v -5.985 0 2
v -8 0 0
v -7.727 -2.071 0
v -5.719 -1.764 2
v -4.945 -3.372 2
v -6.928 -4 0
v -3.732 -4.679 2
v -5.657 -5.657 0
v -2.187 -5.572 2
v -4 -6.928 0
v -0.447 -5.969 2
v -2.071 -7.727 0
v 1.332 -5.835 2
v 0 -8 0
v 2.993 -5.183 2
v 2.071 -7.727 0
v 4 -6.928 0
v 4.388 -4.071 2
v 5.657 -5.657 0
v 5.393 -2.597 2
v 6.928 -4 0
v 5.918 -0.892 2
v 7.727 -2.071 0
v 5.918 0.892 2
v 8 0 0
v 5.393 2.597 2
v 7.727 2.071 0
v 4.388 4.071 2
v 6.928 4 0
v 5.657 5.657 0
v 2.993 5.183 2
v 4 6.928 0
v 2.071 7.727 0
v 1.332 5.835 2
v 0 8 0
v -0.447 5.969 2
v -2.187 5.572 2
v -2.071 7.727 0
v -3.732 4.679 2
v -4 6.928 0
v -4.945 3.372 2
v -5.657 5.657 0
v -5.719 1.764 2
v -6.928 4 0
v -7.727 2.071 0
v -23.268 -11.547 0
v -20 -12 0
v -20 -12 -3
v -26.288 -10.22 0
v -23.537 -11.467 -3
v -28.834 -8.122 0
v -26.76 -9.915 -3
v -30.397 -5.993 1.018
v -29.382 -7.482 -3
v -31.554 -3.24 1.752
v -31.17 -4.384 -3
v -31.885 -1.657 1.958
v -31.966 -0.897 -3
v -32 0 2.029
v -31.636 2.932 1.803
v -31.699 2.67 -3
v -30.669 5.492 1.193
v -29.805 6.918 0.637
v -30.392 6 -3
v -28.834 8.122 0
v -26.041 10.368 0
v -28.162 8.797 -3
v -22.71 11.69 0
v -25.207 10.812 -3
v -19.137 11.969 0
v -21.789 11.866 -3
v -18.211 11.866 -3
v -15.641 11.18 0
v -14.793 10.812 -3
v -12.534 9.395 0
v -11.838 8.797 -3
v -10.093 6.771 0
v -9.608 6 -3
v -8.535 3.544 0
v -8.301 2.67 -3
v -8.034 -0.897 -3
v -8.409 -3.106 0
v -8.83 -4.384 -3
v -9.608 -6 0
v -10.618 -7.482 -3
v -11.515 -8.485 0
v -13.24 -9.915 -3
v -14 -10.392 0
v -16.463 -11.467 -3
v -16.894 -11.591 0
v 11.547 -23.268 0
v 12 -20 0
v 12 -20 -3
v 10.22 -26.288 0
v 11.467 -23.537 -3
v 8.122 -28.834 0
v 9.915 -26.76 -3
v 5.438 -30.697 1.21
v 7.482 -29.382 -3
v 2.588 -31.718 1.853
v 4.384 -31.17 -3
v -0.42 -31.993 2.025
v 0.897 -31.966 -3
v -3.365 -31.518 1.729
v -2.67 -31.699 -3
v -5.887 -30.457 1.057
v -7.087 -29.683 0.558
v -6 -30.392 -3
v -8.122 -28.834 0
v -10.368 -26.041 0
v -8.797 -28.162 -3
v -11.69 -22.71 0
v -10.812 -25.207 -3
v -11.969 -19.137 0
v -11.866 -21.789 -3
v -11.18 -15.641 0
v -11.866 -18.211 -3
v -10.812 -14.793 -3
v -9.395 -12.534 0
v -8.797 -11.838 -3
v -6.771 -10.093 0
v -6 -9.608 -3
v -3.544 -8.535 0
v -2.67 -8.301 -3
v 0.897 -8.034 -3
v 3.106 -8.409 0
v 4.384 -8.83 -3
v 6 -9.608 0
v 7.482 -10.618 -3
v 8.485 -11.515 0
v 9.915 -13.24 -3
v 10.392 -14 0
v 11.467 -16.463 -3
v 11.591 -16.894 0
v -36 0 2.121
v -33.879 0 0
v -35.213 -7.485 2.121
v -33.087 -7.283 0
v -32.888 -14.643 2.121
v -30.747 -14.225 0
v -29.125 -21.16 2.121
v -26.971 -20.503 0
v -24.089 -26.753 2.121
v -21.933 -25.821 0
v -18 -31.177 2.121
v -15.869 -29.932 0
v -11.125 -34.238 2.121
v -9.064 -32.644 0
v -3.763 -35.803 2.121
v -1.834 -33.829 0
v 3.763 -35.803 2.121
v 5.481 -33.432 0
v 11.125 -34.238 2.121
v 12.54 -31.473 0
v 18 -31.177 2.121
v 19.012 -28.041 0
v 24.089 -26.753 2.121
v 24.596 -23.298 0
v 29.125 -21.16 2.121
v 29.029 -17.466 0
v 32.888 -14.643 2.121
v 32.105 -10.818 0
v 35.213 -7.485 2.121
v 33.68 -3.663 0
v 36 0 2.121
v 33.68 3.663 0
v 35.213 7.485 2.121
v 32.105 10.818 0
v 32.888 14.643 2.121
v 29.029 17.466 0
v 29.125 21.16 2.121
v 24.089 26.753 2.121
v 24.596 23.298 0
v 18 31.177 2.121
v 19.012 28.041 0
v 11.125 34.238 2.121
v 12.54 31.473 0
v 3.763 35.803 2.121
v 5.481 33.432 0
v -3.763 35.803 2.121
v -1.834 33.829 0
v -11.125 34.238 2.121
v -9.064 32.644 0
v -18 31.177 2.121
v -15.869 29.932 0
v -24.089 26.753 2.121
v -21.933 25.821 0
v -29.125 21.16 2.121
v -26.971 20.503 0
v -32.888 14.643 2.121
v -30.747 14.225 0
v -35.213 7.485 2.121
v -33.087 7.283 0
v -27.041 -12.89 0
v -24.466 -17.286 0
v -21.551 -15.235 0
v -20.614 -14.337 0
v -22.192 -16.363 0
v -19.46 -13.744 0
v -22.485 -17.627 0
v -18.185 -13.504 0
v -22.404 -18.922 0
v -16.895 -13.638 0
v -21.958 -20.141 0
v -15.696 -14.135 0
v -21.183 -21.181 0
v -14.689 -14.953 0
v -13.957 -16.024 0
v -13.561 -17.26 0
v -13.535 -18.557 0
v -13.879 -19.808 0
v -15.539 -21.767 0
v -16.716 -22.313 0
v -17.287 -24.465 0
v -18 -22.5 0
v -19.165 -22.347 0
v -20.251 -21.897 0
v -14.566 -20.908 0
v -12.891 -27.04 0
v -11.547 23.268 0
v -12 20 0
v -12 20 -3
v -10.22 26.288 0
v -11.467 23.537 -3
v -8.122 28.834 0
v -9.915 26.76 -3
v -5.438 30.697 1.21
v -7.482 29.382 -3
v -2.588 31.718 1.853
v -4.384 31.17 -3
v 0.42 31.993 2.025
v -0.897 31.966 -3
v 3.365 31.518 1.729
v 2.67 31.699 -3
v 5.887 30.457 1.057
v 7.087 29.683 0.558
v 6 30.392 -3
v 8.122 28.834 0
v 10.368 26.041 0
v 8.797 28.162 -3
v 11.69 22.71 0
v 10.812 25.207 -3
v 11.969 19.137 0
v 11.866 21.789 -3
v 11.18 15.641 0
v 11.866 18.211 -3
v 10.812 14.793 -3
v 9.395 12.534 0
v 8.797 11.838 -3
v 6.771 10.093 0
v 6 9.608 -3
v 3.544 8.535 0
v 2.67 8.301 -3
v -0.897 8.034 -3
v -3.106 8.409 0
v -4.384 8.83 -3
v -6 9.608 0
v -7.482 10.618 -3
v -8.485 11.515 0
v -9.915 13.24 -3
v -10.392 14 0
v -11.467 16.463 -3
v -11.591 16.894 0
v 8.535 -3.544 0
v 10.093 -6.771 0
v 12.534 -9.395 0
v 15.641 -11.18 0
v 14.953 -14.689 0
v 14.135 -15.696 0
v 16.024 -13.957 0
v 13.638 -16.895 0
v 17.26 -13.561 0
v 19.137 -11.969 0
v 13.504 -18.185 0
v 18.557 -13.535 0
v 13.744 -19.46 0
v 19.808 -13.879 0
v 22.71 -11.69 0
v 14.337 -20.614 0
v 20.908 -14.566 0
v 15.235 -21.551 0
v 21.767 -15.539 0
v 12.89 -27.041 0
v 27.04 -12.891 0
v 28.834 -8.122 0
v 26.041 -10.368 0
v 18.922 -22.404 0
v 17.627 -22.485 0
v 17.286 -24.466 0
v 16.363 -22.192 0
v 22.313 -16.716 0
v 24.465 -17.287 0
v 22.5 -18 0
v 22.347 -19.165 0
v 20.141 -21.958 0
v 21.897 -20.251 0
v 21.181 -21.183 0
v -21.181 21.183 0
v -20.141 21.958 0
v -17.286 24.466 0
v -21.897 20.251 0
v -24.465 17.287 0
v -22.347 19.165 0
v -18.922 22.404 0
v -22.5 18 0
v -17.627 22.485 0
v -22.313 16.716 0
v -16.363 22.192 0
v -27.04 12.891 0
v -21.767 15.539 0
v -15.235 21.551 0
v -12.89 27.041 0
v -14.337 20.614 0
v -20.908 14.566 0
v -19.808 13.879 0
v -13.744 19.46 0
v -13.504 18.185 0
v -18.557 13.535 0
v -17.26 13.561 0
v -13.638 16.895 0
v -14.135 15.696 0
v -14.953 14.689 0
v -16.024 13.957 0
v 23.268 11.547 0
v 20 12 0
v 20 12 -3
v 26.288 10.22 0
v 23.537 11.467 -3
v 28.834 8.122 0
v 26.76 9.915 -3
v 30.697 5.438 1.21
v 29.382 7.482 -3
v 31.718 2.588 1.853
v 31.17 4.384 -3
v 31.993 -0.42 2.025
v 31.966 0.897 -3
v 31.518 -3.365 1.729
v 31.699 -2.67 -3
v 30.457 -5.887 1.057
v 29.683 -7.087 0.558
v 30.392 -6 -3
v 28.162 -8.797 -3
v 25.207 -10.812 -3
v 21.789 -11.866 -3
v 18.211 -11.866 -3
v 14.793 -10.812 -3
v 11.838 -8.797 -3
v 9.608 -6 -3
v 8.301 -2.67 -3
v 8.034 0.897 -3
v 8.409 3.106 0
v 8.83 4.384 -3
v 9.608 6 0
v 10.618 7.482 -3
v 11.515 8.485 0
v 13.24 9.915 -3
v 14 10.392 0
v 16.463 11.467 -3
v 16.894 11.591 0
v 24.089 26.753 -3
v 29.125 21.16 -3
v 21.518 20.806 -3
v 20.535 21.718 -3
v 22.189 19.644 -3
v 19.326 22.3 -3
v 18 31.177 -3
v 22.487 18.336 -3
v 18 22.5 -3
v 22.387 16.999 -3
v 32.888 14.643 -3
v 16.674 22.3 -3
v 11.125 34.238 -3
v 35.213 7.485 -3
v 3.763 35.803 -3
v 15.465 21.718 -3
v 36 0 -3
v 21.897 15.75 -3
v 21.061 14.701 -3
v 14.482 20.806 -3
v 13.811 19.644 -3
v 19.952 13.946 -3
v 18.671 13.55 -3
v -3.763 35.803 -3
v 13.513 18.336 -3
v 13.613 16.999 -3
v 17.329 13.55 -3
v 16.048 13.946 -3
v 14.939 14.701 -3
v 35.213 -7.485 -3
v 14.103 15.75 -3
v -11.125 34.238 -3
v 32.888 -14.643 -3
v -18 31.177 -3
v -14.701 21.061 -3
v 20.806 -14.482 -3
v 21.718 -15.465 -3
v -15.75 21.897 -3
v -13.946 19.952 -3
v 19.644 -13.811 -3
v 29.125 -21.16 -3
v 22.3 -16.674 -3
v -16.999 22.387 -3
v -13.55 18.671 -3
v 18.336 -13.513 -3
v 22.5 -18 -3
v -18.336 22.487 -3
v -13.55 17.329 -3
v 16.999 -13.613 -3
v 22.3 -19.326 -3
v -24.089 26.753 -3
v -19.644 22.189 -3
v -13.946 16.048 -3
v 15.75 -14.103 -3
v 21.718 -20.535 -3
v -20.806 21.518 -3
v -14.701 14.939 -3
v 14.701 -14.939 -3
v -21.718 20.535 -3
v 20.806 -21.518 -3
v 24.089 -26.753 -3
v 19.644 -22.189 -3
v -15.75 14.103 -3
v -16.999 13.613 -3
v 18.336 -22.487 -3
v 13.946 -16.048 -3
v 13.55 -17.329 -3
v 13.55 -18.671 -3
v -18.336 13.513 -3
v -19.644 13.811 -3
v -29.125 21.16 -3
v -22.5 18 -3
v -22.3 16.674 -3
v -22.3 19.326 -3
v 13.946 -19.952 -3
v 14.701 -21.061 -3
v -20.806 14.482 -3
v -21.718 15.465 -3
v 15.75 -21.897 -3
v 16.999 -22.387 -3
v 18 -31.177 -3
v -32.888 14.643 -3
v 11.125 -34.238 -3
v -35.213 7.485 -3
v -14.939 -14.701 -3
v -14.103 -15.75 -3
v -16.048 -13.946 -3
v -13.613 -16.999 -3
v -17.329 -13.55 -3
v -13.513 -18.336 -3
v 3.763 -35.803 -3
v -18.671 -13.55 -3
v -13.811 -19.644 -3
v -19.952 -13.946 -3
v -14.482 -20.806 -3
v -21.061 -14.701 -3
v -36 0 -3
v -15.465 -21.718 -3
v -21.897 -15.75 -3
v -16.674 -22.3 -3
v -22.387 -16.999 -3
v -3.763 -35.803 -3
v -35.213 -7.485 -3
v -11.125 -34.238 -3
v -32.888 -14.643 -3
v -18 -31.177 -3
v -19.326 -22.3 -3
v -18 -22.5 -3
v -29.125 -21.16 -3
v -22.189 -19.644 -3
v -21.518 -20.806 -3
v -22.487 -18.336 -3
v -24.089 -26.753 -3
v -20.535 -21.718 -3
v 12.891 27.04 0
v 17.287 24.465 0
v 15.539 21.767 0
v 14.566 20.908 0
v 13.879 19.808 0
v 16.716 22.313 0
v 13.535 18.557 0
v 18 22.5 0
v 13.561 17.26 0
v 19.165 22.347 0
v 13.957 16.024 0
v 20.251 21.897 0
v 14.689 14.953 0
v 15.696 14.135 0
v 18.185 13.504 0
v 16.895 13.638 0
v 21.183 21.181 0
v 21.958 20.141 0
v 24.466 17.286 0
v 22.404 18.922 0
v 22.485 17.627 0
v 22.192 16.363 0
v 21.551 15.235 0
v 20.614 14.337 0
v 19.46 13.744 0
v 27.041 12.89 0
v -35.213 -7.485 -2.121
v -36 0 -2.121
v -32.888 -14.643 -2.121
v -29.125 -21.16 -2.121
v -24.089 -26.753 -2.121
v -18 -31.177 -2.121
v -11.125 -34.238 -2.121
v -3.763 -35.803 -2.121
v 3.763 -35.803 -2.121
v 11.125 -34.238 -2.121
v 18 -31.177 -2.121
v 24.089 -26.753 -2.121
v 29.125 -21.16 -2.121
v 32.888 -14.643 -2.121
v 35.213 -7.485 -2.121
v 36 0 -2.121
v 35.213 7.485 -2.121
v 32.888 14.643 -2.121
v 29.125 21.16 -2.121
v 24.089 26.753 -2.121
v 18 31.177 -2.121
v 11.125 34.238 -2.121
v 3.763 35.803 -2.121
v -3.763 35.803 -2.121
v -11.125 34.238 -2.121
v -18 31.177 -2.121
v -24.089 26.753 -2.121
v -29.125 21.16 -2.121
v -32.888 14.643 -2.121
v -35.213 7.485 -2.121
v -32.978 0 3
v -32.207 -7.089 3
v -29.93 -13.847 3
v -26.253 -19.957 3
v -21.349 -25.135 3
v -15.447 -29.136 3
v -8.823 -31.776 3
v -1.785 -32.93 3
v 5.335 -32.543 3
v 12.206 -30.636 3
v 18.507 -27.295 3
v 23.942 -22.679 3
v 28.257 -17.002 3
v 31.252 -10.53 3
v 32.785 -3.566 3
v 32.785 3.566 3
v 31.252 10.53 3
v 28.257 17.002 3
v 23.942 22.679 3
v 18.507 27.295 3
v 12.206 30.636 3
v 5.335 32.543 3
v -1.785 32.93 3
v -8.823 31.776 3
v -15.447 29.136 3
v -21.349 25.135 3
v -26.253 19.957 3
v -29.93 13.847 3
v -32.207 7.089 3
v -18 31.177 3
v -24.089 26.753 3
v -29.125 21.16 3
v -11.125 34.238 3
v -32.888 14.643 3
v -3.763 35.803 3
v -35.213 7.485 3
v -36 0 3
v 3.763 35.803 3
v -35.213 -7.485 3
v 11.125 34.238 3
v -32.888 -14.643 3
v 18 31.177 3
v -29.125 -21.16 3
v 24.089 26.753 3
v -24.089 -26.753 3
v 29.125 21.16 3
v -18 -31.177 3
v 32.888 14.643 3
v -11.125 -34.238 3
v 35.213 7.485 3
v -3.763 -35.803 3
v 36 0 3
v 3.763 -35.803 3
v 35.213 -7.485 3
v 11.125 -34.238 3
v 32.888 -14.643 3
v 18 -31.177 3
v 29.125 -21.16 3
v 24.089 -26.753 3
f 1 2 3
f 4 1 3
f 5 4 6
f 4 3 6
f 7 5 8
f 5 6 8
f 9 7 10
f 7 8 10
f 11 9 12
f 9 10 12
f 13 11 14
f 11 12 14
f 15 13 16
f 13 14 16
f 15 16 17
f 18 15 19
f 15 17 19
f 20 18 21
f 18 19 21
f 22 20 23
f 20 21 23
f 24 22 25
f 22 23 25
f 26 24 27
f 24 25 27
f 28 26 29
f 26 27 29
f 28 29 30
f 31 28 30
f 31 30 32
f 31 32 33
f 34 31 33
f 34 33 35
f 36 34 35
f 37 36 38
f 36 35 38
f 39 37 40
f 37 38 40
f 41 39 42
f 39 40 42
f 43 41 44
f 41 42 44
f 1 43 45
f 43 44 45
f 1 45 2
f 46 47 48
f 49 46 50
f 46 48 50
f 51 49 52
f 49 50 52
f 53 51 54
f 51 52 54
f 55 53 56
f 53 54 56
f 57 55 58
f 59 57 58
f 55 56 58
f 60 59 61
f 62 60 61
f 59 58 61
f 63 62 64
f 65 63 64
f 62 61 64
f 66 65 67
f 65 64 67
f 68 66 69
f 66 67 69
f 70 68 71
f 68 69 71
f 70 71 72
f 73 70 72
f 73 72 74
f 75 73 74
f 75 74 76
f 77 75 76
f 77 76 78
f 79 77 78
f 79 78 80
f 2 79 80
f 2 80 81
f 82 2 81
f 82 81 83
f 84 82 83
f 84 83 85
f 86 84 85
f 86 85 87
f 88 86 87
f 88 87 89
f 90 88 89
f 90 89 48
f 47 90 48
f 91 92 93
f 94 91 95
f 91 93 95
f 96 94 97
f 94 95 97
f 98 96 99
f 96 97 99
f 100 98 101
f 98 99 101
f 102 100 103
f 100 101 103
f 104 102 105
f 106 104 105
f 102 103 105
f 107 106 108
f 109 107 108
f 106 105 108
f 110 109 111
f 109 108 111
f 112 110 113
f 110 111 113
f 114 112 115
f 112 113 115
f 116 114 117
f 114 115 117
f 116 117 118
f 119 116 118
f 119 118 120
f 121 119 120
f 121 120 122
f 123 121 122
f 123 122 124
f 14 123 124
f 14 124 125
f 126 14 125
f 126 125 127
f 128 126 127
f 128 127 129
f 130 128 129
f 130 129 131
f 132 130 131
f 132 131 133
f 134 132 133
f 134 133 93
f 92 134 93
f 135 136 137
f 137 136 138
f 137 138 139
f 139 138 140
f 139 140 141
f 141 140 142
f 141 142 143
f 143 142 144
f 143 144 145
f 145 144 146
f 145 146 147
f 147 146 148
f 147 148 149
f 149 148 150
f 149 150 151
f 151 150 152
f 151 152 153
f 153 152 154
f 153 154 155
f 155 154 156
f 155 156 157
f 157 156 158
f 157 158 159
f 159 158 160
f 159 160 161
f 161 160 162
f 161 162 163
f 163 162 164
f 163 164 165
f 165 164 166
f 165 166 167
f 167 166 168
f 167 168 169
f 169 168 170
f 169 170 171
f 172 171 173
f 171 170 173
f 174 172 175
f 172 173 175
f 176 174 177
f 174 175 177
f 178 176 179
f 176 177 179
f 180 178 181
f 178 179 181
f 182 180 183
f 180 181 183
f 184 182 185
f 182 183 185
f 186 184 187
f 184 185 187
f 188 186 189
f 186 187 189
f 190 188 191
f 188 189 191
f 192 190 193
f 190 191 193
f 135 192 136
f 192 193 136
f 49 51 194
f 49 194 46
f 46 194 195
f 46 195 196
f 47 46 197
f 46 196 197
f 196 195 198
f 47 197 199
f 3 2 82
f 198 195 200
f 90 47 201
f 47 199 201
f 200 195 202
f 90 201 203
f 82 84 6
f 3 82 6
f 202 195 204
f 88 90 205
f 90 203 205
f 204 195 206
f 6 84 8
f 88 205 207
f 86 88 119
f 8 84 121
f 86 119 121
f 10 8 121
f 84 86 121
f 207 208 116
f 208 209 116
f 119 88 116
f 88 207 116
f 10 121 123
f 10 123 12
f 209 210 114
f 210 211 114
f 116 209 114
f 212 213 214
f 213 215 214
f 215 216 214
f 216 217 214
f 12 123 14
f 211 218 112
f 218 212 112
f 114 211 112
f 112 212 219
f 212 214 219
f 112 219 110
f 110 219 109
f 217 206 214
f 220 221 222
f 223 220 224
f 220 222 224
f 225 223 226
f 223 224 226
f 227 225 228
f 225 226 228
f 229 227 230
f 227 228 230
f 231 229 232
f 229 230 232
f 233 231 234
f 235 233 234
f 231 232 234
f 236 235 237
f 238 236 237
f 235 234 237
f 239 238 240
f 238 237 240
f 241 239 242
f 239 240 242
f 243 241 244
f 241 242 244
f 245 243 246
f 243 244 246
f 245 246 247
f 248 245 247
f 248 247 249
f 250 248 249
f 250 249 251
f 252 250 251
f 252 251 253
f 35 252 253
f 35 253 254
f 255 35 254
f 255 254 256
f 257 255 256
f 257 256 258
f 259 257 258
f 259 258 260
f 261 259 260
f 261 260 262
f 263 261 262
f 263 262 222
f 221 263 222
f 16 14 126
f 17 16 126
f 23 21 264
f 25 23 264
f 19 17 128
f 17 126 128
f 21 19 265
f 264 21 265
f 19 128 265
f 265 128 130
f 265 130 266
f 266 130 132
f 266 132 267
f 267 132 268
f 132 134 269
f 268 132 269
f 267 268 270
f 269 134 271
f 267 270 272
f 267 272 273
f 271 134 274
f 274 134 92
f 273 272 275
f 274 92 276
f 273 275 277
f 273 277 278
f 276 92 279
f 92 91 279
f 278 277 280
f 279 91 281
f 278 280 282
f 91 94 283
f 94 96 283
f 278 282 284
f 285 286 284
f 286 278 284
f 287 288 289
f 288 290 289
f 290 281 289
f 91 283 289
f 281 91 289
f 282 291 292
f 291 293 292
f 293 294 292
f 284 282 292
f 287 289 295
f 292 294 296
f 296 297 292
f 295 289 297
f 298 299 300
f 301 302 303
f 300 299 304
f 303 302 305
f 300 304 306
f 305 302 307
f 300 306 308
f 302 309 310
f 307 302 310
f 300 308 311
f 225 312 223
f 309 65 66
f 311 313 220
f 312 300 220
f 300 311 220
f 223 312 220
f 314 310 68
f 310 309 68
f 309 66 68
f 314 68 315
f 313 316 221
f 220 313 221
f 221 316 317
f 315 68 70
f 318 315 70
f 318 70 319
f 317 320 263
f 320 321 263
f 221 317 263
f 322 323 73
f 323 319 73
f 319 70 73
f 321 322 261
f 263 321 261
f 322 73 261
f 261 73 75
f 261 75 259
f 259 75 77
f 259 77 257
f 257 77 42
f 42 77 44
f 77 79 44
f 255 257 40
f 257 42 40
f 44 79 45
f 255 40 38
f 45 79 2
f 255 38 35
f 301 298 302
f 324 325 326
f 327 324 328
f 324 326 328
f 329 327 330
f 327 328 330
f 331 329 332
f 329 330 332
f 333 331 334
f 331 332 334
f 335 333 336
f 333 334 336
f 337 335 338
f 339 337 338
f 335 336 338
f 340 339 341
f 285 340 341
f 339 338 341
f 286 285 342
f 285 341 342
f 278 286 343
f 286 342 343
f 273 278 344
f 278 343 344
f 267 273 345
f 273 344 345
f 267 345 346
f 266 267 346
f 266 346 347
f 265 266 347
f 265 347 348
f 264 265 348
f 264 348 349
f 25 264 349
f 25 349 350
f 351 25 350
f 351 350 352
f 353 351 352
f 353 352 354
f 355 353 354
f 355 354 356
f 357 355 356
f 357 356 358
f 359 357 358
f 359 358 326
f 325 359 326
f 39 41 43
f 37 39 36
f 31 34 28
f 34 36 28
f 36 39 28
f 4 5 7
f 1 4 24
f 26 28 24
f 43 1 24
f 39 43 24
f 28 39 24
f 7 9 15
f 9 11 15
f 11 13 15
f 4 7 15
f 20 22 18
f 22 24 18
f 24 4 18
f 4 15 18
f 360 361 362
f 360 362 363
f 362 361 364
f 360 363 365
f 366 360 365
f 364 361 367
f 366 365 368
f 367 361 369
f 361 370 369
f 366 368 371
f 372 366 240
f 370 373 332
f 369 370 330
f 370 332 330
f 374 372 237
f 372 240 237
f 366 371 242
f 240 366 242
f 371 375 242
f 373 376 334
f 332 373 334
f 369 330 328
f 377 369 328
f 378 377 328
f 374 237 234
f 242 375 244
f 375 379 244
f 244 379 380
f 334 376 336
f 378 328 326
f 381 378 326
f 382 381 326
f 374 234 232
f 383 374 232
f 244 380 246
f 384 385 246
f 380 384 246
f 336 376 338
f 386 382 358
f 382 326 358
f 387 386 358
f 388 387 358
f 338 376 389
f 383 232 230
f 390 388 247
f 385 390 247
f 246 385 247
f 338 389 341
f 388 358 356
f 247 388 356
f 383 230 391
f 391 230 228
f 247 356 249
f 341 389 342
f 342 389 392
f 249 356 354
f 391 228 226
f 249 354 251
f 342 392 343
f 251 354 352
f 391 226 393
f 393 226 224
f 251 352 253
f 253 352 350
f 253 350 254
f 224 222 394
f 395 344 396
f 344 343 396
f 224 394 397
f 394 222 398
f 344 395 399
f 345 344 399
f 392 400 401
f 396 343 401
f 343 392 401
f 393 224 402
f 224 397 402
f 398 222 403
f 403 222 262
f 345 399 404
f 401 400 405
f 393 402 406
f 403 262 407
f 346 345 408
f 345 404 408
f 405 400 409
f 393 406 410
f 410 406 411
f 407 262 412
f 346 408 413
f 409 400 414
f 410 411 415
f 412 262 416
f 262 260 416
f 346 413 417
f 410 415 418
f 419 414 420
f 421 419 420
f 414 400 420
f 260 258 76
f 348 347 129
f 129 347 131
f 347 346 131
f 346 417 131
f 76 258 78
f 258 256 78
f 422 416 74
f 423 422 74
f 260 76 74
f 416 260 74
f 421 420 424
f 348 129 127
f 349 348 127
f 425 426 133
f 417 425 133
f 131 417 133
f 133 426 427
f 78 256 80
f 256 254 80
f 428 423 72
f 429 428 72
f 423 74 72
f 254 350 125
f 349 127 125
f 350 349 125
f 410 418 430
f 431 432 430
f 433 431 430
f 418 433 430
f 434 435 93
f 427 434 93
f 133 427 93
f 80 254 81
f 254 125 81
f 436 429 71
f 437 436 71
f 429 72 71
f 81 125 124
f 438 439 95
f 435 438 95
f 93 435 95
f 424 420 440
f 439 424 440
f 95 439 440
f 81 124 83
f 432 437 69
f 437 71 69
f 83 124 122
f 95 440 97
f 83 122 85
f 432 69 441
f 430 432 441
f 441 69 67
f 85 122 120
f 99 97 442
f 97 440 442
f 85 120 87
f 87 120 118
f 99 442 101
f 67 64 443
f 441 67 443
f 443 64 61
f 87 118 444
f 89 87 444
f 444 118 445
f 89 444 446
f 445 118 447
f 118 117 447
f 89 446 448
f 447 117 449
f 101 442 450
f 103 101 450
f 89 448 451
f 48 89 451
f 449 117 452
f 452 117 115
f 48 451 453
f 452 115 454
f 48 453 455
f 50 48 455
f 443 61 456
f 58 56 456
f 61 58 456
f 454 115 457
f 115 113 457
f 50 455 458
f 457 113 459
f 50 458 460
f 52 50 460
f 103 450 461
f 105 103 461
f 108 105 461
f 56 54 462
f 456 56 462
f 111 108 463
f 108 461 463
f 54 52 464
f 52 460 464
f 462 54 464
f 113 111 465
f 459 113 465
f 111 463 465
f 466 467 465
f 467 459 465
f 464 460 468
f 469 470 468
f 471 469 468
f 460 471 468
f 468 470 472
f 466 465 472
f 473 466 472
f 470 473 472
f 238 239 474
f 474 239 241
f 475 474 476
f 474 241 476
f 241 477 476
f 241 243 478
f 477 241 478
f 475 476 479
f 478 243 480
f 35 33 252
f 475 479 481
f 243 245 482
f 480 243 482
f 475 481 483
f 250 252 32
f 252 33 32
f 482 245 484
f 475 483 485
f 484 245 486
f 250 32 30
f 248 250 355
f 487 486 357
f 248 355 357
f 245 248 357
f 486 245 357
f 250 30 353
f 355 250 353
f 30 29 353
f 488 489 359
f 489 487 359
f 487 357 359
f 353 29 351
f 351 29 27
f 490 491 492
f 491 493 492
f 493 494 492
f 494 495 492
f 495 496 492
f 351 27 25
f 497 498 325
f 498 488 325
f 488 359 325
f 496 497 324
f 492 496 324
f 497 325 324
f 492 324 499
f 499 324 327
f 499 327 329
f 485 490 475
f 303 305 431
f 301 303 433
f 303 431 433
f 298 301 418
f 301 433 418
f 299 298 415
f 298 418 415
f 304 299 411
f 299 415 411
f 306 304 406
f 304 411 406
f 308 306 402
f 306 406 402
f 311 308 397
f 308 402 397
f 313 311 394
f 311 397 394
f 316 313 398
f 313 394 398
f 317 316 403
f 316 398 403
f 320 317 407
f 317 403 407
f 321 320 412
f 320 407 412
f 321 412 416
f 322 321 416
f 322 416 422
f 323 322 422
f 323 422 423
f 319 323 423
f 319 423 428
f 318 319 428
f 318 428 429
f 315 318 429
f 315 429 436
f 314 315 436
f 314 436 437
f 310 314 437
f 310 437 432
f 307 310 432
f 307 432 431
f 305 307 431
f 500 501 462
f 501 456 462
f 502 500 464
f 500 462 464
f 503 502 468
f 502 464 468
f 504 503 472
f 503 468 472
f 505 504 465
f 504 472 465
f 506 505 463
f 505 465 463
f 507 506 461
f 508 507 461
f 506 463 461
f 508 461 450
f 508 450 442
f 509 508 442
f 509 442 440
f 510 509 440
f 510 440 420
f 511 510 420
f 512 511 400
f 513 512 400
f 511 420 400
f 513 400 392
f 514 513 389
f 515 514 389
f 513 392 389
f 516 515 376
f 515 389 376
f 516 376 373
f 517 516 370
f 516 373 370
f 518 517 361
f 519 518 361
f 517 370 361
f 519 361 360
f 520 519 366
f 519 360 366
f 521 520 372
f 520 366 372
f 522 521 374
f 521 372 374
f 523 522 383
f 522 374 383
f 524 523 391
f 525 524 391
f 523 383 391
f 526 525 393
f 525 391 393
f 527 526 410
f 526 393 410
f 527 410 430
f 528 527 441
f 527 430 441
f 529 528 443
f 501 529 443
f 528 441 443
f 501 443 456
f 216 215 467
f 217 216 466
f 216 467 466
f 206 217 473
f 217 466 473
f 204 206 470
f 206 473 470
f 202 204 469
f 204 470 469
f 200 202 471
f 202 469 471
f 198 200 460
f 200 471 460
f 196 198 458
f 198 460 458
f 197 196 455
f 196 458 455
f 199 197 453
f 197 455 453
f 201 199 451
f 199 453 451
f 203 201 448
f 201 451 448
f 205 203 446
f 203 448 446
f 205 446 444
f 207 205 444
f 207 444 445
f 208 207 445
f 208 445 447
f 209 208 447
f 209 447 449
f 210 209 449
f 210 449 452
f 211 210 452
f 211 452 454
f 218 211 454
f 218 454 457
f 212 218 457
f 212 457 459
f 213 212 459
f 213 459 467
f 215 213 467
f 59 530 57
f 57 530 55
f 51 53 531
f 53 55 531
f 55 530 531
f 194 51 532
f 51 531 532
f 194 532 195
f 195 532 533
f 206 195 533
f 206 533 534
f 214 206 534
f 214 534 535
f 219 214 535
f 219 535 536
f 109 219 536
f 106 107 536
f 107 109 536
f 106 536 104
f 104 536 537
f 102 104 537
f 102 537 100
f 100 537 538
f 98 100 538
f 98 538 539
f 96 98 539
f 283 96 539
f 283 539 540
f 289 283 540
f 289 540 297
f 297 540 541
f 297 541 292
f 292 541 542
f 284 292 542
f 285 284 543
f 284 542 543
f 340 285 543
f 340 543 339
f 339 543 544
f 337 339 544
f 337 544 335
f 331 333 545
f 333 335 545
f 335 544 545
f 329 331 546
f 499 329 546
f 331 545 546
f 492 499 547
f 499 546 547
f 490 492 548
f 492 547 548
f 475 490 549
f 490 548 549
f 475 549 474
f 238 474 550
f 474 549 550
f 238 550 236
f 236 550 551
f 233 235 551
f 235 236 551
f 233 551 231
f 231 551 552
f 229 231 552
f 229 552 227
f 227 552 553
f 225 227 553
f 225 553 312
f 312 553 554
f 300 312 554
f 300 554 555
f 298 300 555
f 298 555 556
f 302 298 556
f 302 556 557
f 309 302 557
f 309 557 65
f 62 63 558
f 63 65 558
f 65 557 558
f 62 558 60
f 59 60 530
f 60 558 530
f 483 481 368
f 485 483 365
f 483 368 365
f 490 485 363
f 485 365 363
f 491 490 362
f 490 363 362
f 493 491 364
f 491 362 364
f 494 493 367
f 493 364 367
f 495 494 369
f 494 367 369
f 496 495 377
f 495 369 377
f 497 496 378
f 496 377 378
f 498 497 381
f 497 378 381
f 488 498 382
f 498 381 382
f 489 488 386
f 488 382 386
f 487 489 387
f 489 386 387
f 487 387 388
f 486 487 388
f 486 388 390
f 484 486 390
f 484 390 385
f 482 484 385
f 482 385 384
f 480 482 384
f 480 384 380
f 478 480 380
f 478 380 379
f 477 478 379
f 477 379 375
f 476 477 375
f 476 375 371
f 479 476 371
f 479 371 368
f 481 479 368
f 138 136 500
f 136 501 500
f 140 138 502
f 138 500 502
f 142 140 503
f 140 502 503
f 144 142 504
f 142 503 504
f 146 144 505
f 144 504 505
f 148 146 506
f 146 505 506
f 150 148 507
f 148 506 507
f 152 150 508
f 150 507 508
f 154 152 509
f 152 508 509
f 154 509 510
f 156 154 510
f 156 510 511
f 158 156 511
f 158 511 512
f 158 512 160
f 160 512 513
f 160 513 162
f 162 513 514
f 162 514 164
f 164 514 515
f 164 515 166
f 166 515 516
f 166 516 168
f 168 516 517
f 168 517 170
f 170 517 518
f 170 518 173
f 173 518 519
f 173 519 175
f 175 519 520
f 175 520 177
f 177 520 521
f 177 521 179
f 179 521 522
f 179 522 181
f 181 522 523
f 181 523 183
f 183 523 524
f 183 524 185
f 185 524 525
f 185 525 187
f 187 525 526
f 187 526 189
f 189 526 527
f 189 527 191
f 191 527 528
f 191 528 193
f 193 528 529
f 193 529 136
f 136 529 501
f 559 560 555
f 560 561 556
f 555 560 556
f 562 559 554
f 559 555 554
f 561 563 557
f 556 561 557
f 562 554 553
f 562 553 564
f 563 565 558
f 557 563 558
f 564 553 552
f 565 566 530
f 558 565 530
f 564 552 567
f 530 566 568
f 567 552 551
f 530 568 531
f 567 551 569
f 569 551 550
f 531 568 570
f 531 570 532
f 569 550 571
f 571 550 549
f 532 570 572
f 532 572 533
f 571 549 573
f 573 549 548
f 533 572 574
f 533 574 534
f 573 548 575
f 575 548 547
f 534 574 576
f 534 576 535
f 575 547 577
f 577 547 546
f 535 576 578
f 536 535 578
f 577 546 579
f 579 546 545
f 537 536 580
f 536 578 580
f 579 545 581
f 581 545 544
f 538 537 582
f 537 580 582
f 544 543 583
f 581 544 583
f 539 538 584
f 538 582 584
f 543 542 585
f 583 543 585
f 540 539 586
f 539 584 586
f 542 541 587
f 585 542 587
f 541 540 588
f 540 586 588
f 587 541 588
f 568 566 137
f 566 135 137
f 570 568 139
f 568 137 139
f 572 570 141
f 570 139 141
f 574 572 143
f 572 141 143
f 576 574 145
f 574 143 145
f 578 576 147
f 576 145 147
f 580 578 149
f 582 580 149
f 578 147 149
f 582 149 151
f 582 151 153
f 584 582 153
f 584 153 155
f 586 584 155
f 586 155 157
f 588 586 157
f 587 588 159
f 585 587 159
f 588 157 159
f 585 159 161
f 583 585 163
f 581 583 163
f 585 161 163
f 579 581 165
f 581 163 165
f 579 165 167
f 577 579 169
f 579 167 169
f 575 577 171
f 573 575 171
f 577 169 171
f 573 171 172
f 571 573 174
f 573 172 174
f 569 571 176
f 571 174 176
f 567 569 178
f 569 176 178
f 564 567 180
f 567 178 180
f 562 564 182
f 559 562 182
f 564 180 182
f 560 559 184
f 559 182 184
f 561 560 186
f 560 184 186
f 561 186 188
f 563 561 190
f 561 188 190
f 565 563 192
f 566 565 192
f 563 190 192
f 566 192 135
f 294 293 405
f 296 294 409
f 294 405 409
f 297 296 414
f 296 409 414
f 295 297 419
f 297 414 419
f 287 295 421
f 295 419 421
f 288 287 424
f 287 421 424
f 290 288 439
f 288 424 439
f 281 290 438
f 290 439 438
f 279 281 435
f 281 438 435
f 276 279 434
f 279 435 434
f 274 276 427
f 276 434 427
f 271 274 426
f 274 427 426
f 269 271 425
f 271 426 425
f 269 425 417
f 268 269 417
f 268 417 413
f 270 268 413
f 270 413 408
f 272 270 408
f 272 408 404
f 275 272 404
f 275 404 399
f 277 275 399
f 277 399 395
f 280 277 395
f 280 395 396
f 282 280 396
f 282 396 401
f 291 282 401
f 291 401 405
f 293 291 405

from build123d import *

# Parameters (mm, degrees)
SKETCH001_R           = 12
SKETCH001_R_2         = 4.5
POCKET_DEPTH          = 210.001
POLARPATTERN001_COUNT = 4


with BuildPart() as part:
    # Sketch → Revolution (revolve)
    with BuildSketch(Plane.XZ):
        Polygon((0, 2), (-5.985281, 2), (-8, 0), (-29.955844, 0), (-32.977922, 3), (-36, 3), (-36, 2.12132), (-33.87868, 0), (-36, -2.12132), (-36, -3), (0, -3), align=None)
    revolve(axis=Axis((0, 0, 0), (0, 0, 1)))

    # Sketch001 → Pocket (cut, through all)
    with BuildSketch(Plane(origin=(0, 0, -3), x_dir=(1, 0, 0), z_dir=(0, 0, -1))):
        with Locations((0, 20)):
            Circle(SKETCH001_R)
        with Locations((18, 18)):
            Circle(SKETCH001_R_2)
    pocket = extrude(amount=-POCKET_DEPTH, mode=Mode.SUBTRACT)

    # PolarPattern001: Pocket ×4 about axis
    polarpattern001_axis = Axis((0, 0, -3), (0, 0, -1))
    for i in range(1, POLARPATTERN001_COUNT):
        add(pocket.rotate(polarpattern001_axis, i * 360 / POLARPATTERN001_COUNT), mode=Mode.SUBTRACT)


solid = part.part
